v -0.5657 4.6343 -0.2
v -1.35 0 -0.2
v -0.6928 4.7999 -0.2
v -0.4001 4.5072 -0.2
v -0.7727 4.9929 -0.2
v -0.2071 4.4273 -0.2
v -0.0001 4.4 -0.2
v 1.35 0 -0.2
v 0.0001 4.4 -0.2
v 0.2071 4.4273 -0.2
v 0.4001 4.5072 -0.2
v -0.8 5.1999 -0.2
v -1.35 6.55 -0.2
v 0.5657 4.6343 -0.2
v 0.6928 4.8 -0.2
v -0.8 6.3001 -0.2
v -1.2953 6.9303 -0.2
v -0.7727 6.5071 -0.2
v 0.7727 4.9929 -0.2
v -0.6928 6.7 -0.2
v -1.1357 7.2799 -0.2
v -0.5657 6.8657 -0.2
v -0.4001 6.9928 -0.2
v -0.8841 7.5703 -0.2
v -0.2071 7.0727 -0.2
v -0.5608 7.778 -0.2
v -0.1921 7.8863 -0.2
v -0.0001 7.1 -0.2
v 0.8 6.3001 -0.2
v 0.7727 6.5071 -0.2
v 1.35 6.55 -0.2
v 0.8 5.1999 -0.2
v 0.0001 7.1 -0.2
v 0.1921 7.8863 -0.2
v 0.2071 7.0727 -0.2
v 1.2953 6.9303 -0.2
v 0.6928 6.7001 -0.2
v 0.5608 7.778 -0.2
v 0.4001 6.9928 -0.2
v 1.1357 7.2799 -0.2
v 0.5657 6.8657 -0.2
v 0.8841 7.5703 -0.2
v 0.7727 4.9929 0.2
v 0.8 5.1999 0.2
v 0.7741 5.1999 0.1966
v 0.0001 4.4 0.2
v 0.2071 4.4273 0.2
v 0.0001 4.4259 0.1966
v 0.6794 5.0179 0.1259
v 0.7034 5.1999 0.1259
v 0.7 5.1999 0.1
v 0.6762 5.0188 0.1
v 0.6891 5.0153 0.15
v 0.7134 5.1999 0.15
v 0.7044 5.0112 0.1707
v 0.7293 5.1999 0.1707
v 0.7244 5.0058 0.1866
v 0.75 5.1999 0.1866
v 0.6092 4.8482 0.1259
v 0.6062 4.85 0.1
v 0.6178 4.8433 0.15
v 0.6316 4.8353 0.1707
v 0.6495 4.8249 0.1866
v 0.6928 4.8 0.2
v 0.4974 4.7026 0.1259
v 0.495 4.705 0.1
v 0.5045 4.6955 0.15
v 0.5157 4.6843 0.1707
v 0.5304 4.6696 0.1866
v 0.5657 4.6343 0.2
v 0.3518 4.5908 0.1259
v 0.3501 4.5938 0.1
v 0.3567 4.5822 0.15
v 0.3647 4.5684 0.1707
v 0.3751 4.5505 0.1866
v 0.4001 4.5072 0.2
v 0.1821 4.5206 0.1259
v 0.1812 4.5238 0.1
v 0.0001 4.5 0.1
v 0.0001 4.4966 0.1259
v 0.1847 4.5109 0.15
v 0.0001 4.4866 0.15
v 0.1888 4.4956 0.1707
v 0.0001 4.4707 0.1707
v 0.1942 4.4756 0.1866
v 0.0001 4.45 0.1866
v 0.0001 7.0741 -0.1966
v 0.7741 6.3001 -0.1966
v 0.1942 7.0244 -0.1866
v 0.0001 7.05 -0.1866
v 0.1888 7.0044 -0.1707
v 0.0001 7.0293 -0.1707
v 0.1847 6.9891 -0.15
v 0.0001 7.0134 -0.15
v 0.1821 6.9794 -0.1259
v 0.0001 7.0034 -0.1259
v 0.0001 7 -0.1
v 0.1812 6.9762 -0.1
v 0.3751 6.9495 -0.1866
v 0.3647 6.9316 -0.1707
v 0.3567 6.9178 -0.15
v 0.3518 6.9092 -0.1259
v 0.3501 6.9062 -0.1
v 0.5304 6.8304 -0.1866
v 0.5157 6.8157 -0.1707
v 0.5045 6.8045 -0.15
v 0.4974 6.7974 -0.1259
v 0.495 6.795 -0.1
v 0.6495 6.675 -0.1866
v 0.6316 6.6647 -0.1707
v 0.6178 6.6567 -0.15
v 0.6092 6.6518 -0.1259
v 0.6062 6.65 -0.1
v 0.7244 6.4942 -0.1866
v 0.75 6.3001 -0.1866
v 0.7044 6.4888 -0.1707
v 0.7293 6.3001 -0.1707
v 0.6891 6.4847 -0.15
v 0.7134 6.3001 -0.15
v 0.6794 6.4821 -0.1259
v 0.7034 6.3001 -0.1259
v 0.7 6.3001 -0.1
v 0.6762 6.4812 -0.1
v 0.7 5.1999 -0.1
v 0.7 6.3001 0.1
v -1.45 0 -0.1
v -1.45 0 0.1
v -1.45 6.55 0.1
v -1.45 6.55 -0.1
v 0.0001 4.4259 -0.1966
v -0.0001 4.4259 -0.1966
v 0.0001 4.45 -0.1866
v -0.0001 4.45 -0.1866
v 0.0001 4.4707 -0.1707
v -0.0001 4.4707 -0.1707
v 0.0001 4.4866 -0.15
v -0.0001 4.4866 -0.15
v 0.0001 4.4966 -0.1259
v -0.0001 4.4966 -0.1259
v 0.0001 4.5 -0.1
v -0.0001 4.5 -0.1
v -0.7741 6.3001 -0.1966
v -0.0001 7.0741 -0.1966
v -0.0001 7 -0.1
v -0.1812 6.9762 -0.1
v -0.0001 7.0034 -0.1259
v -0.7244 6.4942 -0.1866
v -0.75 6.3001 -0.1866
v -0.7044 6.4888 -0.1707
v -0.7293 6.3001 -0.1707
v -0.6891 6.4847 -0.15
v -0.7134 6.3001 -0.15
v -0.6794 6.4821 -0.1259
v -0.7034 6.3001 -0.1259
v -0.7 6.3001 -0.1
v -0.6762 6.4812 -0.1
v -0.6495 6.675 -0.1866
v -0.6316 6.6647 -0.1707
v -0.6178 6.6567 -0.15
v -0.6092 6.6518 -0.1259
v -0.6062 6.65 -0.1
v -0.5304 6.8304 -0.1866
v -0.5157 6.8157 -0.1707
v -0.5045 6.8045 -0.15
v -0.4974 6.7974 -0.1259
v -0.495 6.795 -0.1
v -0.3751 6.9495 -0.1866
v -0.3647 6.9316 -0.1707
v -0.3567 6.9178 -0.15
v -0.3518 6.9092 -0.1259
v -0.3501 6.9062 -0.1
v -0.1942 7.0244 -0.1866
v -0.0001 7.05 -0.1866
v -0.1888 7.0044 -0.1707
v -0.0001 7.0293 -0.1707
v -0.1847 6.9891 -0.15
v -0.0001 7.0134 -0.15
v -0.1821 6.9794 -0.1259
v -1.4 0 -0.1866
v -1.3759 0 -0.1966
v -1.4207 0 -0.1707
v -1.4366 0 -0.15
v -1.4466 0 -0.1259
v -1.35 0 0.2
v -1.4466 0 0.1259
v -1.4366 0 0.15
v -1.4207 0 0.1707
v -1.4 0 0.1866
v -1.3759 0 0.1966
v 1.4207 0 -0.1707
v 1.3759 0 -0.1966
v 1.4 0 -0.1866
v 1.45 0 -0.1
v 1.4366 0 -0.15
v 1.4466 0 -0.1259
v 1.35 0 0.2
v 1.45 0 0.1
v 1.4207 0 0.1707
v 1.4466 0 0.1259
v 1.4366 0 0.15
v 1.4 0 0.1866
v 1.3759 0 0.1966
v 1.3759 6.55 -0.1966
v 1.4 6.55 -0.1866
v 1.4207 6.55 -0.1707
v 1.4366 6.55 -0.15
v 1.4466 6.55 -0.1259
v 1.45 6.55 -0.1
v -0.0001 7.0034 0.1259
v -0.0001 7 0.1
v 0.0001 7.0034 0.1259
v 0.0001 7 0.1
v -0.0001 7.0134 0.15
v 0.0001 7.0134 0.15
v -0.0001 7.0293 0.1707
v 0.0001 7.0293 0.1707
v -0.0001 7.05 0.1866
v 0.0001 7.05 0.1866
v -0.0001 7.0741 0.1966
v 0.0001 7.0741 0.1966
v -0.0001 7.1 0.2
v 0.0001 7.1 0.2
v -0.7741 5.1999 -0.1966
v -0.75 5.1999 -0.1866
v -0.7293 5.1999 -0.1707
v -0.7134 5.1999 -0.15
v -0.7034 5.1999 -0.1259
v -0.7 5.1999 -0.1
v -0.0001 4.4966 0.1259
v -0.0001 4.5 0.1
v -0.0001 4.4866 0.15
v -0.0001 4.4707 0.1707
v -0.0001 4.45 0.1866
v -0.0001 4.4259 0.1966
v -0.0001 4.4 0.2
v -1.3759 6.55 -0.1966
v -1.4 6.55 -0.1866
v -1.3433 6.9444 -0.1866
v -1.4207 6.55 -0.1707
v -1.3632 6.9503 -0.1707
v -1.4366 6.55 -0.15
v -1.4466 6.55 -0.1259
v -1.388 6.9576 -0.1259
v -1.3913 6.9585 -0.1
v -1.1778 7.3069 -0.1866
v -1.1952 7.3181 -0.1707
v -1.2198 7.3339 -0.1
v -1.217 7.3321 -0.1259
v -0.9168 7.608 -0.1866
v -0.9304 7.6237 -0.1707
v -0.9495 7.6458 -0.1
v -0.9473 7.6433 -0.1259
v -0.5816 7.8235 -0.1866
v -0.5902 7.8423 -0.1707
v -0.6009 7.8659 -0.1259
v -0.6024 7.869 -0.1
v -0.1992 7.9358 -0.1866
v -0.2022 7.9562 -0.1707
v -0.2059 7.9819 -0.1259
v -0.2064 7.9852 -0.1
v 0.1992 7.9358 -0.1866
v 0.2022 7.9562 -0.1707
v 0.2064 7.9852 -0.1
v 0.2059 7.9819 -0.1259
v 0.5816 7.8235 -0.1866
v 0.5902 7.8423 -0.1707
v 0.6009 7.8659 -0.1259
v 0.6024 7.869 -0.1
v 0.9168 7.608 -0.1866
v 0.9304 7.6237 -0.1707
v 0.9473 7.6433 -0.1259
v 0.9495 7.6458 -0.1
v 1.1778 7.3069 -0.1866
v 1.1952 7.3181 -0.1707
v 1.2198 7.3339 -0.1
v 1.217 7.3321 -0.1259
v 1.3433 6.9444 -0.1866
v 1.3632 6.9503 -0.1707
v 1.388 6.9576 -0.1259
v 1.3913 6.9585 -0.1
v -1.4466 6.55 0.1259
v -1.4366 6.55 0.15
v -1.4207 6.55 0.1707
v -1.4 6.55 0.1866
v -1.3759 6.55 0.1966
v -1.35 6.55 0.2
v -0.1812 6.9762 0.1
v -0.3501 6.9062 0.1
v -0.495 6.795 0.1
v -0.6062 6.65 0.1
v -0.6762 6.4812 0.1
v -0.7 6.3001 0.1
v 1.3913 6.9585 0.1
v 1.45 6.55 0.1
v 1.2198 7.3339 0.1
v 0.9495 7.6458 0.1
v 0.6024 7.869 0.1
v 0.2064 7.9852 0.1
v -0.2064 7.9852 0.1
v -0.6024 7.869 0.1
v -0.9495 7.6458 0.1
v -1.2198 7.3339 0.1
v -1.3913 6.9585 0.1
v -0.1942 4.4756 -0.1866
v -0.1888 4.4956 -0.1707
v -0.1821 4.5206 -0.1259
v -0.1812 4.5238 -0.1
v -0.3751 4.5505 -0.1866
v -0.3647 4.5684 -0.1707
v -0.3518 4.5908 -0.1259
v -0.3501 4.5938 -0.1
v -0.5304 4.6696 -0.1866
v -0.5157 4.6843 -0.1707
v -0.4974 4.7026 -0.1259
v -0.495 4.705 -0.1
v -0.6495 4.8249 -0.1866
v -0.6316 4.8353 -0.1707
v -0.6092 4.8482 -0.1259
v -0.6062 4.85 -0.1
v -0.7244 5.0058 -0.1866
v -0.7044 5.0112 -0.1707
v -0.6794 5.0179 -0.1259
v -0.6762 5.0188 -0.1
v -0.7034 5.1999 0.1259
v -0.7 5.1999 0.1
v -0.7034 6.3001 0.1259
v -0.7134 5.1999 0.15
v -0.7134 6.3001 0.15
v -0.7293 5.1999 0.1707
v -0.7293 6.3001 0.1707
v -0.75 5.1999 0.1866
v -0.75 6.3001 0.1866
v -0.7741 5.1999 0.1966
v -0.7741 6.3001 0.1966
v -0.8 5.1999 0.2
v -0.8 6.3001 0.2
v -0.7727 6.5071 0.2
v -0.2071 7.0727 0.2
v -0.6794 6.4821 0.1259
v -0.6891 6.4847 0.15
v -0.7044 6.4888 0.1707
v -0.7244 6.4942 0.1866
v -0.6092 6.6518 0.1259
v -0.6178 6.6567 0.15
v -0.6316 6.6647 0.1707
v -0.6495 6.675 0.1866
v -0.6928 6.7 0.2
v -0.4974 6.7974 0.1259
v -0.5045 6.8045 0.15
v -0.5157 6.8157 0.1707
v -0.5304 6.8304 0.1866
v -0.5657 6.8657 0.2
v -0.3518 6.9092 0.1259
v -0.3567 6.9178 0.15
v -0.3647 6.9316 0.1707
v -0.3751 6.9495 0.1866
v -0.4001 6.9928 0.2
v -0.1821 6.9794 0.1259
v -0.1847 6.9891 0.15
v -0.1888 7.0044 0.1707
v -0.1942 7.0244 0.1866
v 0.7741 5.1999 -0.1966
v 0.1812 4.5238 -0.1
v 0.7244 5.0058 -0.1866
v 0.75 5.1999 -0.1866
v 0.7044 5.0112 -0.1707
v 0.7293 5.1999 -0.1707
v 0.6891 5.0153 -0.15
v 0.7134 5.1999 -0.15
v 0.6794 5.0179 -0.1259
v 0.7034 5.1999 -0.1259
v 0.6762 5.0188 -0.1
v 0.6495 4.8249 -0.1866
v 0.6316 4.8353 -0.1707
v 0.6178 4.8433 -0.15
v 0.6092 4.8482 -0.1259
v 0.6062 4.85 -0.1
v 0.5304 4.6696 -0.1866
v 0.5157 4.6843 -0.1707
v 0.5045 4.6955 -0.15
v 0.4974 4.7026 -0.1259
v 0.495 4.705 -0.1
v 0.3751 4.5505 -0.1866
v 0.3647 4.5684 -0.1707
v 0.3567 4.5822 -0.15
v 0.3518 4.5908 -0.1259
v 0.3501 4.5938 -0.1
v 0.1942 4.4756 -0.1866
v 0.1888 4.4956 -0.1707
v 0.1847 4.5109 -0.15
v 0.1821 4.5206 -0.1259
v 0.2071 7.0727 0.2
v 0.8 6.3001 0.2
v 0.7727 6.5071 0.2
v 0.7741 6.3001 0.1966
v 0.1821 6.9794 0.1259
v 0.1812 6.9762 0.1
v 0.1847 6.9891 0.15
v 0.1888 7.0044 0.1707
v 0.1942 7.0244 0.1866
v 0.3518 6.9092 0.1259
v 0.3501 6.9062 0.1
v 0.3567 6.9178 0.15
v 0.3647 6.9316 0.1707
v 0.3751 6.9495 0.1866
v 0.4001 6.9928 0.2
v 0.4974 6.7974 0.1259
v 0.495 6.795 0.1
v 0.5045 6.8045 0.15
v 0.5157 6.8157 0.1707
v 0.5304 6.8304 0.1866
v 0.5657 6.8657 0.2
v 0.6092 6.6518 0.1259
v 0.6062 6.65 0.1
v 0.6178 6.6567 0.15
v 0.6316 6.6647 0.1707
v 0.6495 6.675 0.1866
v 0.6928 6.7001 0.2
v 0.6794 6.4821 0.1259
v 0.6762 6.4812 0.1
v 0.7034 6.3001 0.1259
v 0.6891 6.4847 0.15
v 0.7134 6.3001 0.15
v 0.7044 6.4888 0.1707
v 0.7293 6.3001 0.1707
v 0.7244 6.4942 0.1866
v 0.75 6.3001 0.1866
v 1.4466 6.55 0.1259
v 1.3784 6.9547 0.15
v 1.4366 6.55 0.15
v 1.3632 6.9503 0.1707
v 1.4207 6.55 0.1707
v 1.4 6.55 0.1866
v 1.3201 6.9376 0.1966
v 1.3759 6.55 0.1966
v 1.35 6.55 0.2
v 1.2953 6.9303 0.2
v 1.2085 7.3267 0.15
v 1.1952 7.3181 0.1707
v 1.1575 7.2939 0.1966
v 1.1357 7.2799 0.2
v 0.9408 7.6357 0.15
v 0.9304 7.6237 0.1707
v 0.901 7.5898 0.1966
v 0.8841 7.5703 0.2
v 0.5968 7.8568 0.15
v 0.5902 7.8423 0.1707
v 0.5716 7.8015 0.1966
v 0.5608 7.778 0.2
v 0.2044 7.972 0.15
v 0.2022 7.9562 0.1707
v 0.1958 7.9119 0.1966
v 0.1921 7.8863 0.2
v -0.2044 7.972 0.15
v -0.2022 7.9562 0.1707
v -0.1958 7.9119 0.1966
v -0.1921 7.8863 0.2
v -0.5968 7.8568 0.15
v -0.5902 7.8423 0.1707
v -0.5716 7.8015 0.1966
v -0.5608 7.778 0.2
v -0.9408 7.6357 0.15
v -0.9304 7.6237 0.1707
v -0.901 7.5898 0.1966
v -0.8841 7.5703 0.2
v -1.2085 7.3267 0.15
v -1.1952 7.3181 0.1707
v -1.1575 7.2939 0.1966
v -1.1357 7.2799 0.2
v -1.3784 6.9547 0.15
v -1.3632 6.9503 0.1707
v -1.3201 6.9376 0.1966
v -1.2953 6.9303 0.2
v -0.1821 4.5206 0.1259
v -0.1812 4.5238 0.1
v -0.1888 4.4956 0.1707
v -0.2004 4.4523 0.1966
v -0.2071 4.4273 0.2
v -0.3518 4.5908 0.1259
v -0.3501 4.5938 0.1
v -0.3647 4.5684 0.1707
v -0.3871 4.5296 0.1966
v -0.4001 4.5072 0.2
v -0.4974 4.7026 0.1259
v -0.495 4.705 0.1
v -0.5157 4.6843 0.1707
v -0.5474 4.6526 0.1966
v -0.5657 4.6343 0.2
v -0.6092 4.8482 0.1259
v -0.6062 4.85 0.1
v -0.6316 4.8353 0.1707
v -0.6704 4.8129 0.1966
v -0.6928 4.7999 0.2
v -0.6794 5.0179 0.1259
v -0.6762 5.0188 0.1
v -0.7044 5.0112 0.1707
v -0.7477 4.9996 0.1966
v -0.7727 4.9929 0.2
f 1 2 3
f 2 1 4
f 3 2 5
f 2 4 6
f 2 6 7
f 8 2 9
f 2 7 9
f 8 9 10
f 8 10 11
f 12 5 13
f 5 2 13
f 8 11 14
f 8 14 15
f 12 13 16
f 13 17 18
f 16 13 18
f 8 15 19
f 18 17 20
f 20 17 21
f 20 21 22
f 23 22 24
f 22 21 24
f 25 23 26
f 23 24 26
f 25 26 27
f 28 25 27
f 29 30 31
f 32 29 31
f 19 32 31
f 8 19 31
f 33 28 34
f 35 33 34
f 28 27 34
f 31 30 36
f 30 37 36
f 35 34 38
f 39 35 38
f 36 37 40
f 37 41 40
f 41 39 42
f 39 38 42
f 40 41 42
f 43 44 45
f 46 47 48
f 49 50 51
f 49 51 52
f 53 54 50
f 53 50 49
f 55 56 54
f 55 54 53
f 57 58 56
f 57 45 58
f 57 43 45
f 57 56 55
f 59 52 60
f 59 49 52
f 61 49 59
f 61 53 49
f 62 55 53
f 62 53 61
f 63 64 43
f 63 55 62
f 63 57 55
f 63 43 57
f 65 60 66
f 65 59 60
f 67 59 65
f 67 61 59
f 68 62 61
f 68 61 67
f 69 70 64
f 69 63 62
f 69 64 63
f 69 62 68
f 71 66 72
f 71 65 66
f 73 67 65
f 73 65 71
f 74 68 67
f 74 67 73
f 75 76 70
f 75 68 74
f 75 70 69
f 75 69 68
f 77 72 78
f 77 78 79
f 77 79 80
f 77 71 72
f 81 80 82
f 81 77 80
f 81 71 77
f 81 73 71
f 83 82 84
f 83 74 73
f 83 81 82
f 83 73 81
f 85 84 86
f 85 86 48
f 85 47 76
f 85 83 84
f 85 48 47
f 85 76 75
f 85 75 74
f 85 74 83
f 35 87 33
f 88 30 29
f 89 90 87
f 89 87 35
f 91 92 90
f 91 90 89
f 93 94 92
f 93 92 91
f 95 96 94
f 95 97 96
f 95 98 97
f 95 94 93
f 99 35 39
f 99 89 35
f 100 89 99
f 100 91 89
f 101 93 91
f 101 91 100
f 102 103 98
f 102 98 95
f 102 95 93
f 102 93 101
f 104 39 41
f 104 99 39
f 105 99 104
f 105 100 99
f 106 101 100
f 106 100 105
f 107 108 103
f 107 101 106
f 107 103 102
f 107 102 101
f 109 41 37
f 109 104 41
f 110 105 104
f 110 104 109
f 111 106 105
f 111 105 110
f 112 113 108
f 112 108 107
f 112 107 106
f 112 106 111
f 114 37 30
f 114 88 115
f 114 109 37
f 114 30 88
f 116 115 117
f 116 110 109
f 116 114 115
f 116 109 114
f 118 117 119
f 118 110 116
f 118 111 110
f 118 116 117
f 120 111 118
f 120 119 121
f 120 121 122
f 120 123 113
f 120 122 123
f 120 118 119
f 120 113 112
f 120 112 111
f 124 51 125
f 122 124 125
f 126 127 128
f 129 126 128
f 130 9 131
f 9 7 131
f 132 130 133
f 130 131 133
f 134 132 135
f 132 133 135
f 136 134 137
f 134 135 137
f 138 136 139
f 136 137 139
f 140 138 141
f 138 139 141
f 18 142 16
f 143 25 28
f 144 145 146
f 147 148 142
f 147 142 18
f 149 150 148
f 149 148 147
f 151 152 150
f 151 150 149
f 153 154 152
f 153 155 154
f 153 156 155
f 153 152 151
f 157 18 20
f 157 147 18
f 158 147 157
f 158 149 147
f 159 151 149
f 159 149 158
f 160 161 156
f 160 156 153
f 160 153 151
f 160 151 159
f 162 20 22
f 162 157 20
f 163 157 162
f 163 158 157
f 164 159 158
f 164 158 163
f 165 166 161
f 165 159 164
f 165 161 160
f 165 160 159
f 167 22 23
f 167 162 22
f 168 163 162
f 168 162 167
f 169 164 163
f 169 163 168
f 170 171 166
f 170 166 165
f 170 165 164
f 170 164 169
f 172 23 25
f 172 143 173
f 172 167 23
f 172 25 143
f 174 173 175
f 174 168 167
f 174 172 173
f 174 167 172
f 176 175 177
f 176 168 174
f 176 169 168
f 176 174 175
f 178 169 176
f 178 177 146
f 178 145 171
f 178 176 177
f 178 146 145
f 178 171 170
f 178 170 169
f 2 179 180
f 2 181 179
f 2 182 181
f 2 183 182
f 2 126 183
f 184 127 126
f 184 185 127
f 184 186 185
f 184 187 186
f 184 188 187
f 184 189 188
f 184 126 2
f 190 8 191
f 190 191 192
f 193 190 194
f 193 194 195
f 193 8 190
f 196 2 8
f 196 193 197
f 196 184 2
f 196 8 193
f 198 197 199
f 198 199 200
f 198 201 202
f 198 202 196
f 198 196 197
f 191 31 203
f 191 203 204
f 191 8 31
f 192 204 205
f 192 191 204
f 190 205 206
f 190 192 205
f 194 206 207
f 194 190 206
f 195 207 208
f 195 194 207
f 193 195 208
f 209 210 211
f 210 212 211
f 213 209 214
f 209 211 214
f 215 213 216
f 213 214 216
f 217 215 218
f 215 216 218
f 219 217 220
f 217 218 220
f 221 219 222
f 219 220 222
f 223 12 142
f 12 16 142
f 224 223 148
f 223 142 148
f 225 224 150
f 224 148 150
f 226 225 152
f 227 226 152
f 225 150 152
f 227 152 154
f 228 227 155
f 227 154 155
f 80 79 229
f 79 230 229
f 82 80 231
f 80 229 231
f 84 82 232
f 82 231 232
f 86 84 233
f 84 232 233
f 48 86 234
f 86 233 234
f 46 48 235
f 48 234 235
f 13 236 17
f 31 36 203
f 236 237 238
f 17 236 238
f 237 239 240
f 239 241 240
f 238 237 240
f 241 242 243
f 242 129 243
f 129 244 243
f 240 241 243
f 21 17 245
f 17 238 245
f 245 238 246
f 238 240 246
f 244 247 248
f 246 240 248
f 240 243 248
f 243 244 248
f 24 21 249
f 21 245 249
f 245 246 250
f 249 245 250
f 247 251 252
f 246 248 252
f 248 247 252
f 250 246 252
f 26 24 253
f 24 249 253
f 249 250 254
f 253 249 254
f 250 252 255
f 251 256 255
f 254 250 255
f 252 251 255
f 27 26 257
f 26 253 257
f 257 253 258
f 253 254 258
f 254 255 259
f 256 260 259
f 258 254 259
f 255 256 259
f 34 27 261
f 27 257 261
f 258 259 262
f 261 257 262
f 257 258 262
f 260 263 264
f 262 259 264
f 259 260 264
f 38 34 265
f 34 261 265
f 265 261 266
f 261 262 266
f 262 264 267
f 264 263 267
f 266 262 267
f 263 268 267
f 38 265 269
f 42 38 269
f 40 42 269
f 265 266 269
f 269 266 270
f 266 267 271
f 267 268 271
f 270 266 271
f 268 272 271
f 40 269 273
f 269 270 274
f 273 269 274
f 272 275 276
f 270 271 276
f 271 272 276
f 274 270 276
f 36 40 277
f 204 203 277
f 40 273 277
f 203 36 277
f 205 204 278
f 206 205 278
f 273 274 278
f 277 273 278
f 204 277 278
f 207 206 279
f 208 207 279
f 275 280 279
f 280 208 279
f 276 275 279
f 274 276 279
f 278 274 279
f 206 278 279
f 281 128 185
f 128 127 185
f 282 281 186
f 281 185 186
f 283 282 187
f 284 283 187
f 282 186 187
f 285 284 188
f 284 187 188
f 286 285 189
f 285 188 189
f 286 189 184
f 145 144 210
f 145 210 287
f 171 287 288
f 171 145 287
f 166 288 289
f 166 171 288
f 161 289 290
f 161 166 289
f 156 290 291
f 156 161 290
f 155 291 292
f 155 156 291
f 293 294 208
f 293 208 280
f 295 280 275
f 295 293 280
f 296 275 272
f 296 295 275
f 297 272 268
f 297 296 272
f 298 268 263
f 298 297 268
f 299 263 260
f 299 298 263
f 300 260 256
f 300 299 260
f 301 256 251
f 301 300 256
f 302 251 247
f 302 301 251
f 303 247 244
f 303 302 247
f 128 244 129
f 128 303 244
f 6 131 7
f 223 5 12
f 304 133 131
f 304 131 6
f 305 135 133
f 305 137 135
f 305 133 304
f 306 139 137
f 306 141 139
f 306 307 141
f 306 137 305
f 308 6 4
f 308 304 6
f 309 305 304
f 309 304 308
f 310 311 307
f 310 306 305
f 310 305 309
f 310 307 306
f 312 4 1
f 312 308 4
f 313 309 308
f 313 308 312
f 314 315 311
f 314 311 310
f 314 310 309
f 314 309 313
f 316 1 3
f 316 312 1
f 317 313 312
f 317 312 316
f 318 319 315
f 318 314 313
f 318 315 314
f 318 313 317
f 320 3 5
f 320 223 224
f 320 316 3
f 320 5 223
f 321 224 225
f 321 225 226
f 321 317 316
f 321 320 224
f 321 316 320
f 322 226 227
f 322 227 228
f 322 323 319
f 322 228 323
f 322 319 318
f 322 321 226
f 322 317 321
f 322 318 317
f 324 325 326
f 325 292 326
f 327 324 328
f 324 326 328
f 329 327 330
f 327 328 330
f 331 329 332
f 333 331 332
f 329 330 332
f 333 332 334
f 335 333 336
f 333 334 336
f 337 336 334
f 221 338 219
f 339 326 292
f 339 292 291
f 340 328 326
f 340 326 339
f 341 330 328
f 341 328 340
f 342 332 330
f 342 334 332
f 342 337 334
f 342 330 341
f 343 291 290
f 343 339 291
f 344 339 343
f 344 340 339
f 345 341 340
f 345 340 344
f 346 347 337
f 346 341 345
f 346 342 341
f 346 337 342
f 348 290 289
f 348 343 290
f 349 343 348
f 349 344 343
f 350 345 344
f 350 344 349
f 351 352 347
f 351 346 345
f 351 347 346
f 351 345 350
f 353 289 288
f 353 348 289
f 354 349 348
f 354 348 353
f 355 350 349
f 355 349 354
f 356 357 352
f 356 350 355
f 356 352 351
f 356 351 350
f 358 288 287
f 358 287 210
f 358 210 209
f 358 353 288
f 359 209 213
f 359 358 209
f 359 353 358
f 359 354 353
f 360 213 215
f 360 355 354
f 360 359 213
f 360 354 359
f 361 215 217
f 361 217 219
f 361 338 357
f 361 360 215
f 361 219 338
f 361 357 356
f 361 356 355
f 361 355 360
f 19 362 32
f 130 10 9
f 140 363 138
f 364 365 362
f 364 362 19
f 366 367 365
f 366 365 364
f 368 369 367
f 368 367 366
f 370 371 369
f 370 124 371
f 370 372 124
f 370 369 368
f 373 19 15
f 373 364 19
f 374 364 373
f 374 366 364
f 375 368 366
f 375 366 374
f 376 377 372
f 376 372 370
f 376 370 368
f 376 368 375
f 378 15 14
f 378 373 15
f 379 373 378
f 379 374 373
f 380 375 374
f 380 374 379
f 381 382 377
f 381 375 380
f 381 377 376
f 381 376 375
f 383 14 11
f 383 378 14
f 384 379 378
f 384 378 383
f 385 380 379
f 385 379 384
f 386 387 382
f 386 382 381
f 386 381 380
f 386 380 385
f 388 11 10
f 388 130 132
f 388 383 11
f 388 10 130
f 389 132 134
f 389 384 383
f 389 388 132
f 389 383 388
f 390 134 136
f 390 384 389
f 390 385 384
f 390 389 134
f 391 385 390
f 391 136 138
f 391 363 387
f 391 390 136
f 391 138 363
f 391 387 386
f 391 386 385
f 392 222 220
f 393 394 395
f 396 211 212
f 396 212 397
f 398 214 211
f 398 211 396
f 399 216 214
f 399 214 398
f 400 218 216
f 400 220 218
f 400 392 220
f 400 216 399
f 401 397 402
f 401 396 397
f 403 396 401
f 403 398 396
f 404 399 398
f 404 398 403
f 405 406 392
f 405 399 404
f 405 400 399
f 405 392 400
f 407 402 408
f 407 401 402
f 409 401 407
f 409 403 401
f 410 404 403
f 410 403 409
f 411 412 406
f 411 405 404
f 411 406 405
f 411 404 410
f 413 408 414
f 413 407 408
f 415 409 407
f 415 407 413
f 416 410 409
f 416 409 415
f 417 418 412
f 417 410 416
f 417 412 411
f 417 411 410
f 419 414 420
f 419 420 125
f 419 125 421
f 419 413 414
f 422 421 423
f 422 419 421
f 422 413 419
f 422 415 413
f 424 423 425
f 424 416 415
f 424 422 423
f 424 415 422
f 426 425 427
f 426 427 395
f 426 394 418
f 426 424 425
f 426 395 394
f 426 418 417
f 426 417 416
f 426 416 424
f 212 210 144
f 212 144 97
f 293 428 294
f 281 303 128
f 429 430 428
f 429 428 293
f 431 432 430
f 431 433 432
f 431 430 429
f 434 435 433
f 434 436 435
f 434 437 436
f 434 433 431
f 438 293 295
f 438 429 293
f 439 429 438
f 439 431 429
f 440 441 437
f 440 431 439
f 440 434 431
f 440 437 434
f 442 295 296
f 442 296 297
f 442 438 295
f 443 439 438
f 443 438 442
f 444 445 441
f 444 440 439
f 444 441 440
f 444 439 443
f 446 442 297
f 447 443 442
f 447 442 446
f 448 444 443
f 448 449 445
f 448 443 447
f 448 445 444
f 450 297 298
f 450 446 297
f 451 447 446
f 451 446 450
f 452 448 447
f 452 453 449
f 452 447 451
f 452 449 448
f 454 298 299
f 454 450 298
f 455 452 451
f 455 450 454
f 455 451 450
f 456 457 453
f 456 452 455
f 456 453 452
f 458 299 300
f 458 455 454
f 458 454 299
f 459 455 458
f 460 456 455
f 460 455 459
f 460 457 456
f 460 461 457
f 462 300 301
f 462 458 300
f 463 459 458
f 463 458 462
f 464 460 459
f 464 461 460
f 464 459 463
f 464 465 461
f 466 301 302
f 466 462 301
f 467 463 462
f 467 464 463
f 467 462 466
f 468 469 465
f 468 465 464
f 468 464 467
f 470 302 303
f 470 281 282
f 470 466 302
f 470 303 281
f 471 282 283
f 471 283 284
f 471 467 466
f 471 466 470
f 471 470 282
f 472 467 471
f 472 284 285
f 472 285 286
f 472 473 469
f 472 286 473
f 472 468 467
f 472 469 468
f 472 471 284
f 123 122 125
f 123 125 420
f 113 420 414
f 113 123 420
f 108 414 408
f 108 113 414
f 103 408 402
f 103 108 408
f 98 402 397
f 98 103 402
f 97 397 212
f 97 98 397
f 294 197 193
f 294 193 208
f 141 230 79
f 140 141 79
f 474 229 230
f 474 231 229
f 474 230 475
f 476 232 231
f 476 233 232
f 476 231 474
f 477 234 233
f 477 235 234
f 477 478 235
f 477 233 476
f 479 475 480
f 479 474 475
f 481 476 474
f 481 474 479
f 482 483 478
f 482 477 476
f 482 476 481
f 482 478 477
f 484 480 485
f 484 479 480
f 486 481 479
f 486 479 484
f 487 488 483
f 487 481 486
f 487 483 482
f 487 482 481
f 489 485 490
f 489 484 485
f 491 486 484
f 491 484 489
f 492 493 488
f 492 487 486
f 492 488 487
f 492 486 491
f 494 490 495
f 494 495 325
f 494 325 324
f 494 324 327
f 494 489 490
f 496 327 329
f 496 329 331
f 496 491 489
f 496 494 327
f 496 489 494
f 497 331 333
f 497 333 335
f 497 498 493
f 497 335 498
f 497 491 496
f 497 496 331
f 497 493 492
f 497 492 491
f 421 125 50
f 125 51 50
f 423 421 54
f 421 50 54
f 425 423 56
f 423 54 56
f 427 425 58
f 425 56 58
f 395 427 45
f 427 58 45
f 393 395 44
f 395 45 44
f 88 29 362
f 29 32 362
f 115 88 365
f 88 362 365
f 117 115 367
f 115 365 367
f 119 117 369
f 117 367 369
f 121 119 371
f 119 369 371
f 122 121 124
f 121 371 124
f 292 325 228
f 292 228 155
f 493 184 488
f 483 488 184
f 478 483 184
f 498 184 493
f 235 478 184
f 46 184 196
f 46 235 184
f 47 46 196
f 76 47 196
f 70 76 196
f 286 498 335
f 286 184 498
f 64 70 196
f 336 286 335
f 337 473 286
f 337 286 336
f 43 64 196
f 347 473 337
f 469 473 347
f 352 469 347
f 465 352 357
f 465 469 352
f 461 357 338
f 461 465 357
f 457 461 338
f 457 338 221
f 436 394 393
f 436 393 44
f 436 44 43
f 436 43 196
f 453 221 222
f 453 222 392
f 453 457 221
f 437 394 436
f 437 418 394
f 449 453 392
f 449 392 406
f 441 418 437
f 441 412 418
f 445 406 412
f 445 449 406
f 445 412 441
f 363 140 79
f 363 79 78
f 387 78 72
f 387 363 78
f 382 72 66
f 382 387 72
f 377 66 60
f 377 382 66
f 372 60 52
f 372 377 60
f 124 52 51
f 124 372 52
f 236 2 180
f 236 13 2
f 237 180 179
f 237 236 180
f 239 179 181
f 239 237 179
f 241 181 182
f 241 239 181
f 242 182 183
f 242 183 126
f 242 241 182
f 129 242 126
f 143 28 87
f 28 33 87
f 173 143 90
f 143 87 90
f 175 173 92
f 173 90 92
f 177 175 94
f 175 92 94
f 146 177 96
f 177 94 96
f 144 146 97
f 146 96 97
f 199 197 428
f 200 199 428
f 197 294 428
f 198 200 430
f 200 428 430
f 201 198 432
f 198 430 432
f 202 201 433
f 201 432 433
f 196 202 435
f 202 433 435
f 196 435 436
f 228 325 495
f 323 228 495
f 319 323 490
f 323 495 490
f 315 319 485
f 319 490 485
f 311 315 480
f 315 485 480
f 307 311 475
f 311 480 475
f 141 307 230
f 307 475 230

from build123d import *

# Parameters (mm, degrees)
SKETCH1_W      = 2.9
SKETCH1_H      = 8
SKETCH1_W_2    = 1.4
SKETCH1_H_2    = 2.5
EXTRUDE1_DEPTH = 0.2
FILLET4_RADIUS = 1.45
FILLET4_LENGTH = 0.4
FILLET5_R      = 0.7
FILLET6_R      = 0.7
FILLET3_R      = 0.1


with BuildPart() as part:
    # Sketch1 → Extrude1 (new, symmetric)
    with BuildSketch(Plane.XY):
        with Locations((0, 4)):
            Rectangle(SKETCH1_W, SKETCH1_H)
        with Locations((0, 5.75)):
            Rectangle(SKETCH1_W_2, SKETCH1_H_2, mode=Mode.SUBTRACT)
    extrude(amount=EXTRUDE1_DEPTH, both=True)

    # Fillet4: full round fillet: the end face becomes a half cylinder, R = half its width
    fillet4_face = Plane((0, 8, 0), x_dir=(0, 0, 1), z_dir=(0, 1, 0))  # on the end face: x along it, z out of the body
    fillet4_slab = fillet4_face.offset(-FILLET4_RADIUS / 2) * Box(FILLET4_LENGTH, 2 * FILLET4_RADIUS, FILLET4_RADIUS, mode=Mode.PRIVATE)  # the body's end, R deep
    fillet4_round = Plane((0, 6.55, 0), x_dir=(0, 1, 0), z_dir=(0, 0, 1)) * Cylinder(FILLET4_RADIUS, FILLET4_LENGTH, mode=Mode.PRIVATE)  # its axis R under the face
    add(fillet4_slab - fillet4_round, mode=Mode.SUBTRACT)

    # Fillet5
    fillet5_edges = [part.edges().sort_by_distance(p)[0] for p in [
        (-0.7, 7, 0),
        (0.7, 7, 0),
    ]]
    fillet(fillet5_edges, radius=FILLET5_R - 0.0001)  # a hair under: the kernel refuses the full size

    # Fillet6
    fillet6_edges = [part.edges().sort_by_distance(p)[0] for p in [
        (-0.7, 4.5, 0),
        (0.7, 4.5, 0),
    ]]
    fillet(fillet6_edges, radius=FILLET6_R - 0.0001)  # a hair under: the kernel refuses the full size

    # Fillet3
    fillet3_edges = [part.edges().sort_by_distance(p)[0] for p in [
        (1.45, 3.275, 0.2),
        (-1.45, 3.275, -0.2),
        (-1.45, 3.275, 0.2),
        (0, 8, -0.2),
        (0, 8, 0.2),
        (-0.7, 5.75, -0.2),
        (-0.7, 5.75, 0.2),
        (0, 7, -0.2),
        (0, 7, 0.2),
        (0.7, 5.75, 0.2),
        (0.7, 5.75, -0.2),
        (0, 4.5, 0.2),
        (0, 4.5, -0.2),
        (1.45, 3.275, -0.2),
    ]]
    fillet(fillet3_edges, radius=FILLET3_R)


solid = part.part
